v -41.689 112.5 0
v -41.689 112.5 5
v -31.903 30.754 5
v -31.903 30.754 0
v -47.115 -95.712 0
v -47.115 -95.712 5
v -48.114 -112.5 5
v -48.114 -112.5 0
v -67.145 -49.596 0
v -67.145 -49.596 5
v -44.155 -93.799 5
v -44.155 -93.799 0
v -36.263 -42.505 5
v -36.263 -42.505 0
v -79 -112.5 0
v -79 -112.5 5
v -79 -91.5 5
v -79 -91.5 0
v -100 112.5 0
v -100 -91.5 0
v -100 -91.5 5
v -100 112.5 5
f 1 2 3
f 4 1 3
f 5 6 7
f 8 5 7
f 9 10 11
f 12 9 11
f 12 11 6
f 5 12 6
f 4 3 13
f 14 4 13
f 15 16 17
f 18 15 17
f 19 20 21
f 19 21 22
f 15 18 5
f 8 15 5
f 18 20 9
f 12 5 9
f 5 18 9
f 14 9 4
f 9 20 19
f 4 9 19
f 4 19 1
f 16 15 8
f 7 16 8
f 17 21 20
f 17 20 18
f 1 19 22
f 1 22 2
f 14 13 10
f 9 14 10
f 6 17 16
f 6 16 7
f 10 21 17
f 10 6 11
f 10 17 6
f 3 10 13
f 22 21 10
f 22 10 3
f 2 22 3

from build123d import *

# Parameters (mm, degrees)
SKETCH1_W           = 200
SKETCH1_H           = 225
BOSS_EXTRUDE1_DEPTH = 5
SKETCH2_W           = 21
SKETCH2_H           = 21
CUT_EXTRUDE1_DEPTH  = 151.602954818
CUT_EXTRUDE2_DEPTH  = 151.602954818


with BuildPart() as part:
    # Sketch1 → Boss-Extrude1 (new body)
    with BuildSketch(Plane.XY):
        Rectangle(SKETCH1_W, SKETCH1_H)
    extrude(amount=BOSS_EXTRUDE1_DEPTH)

    # Sketch2 → Cut-Extrude1 (cut, through all)
    with BuildSketch(Plane.XY.offset(5)):
        with Locations((-89.5, -102)):
            Rectangle(SKETCH2_W, SKETCH2_H)
    extrude(amount=-CUT_EXTRUDE1_DEPTH, mode=Mode.SUBTRACT)

    # Sketch3 → Cut-Extrude2 (cut, through all)
    with BuildSketch(Plane.XY.offset(5)):
        Polygon((-47.115076642, -95.712122393), (-48.11426359, -112.5), (100, -112.5), (100, 112.5), (-41.68901441, 112.5), (-31.902672347, 30.754430855), (-36.262952178, -42.504976974), (-67.144755679, -49.596294754), (-44.155064893, -93.798693152), align=None)
    extrude(amount=-CUT_EXTRUDE2_DEPTH, mode=Mode.SUBTRACT)


solid = part.part
